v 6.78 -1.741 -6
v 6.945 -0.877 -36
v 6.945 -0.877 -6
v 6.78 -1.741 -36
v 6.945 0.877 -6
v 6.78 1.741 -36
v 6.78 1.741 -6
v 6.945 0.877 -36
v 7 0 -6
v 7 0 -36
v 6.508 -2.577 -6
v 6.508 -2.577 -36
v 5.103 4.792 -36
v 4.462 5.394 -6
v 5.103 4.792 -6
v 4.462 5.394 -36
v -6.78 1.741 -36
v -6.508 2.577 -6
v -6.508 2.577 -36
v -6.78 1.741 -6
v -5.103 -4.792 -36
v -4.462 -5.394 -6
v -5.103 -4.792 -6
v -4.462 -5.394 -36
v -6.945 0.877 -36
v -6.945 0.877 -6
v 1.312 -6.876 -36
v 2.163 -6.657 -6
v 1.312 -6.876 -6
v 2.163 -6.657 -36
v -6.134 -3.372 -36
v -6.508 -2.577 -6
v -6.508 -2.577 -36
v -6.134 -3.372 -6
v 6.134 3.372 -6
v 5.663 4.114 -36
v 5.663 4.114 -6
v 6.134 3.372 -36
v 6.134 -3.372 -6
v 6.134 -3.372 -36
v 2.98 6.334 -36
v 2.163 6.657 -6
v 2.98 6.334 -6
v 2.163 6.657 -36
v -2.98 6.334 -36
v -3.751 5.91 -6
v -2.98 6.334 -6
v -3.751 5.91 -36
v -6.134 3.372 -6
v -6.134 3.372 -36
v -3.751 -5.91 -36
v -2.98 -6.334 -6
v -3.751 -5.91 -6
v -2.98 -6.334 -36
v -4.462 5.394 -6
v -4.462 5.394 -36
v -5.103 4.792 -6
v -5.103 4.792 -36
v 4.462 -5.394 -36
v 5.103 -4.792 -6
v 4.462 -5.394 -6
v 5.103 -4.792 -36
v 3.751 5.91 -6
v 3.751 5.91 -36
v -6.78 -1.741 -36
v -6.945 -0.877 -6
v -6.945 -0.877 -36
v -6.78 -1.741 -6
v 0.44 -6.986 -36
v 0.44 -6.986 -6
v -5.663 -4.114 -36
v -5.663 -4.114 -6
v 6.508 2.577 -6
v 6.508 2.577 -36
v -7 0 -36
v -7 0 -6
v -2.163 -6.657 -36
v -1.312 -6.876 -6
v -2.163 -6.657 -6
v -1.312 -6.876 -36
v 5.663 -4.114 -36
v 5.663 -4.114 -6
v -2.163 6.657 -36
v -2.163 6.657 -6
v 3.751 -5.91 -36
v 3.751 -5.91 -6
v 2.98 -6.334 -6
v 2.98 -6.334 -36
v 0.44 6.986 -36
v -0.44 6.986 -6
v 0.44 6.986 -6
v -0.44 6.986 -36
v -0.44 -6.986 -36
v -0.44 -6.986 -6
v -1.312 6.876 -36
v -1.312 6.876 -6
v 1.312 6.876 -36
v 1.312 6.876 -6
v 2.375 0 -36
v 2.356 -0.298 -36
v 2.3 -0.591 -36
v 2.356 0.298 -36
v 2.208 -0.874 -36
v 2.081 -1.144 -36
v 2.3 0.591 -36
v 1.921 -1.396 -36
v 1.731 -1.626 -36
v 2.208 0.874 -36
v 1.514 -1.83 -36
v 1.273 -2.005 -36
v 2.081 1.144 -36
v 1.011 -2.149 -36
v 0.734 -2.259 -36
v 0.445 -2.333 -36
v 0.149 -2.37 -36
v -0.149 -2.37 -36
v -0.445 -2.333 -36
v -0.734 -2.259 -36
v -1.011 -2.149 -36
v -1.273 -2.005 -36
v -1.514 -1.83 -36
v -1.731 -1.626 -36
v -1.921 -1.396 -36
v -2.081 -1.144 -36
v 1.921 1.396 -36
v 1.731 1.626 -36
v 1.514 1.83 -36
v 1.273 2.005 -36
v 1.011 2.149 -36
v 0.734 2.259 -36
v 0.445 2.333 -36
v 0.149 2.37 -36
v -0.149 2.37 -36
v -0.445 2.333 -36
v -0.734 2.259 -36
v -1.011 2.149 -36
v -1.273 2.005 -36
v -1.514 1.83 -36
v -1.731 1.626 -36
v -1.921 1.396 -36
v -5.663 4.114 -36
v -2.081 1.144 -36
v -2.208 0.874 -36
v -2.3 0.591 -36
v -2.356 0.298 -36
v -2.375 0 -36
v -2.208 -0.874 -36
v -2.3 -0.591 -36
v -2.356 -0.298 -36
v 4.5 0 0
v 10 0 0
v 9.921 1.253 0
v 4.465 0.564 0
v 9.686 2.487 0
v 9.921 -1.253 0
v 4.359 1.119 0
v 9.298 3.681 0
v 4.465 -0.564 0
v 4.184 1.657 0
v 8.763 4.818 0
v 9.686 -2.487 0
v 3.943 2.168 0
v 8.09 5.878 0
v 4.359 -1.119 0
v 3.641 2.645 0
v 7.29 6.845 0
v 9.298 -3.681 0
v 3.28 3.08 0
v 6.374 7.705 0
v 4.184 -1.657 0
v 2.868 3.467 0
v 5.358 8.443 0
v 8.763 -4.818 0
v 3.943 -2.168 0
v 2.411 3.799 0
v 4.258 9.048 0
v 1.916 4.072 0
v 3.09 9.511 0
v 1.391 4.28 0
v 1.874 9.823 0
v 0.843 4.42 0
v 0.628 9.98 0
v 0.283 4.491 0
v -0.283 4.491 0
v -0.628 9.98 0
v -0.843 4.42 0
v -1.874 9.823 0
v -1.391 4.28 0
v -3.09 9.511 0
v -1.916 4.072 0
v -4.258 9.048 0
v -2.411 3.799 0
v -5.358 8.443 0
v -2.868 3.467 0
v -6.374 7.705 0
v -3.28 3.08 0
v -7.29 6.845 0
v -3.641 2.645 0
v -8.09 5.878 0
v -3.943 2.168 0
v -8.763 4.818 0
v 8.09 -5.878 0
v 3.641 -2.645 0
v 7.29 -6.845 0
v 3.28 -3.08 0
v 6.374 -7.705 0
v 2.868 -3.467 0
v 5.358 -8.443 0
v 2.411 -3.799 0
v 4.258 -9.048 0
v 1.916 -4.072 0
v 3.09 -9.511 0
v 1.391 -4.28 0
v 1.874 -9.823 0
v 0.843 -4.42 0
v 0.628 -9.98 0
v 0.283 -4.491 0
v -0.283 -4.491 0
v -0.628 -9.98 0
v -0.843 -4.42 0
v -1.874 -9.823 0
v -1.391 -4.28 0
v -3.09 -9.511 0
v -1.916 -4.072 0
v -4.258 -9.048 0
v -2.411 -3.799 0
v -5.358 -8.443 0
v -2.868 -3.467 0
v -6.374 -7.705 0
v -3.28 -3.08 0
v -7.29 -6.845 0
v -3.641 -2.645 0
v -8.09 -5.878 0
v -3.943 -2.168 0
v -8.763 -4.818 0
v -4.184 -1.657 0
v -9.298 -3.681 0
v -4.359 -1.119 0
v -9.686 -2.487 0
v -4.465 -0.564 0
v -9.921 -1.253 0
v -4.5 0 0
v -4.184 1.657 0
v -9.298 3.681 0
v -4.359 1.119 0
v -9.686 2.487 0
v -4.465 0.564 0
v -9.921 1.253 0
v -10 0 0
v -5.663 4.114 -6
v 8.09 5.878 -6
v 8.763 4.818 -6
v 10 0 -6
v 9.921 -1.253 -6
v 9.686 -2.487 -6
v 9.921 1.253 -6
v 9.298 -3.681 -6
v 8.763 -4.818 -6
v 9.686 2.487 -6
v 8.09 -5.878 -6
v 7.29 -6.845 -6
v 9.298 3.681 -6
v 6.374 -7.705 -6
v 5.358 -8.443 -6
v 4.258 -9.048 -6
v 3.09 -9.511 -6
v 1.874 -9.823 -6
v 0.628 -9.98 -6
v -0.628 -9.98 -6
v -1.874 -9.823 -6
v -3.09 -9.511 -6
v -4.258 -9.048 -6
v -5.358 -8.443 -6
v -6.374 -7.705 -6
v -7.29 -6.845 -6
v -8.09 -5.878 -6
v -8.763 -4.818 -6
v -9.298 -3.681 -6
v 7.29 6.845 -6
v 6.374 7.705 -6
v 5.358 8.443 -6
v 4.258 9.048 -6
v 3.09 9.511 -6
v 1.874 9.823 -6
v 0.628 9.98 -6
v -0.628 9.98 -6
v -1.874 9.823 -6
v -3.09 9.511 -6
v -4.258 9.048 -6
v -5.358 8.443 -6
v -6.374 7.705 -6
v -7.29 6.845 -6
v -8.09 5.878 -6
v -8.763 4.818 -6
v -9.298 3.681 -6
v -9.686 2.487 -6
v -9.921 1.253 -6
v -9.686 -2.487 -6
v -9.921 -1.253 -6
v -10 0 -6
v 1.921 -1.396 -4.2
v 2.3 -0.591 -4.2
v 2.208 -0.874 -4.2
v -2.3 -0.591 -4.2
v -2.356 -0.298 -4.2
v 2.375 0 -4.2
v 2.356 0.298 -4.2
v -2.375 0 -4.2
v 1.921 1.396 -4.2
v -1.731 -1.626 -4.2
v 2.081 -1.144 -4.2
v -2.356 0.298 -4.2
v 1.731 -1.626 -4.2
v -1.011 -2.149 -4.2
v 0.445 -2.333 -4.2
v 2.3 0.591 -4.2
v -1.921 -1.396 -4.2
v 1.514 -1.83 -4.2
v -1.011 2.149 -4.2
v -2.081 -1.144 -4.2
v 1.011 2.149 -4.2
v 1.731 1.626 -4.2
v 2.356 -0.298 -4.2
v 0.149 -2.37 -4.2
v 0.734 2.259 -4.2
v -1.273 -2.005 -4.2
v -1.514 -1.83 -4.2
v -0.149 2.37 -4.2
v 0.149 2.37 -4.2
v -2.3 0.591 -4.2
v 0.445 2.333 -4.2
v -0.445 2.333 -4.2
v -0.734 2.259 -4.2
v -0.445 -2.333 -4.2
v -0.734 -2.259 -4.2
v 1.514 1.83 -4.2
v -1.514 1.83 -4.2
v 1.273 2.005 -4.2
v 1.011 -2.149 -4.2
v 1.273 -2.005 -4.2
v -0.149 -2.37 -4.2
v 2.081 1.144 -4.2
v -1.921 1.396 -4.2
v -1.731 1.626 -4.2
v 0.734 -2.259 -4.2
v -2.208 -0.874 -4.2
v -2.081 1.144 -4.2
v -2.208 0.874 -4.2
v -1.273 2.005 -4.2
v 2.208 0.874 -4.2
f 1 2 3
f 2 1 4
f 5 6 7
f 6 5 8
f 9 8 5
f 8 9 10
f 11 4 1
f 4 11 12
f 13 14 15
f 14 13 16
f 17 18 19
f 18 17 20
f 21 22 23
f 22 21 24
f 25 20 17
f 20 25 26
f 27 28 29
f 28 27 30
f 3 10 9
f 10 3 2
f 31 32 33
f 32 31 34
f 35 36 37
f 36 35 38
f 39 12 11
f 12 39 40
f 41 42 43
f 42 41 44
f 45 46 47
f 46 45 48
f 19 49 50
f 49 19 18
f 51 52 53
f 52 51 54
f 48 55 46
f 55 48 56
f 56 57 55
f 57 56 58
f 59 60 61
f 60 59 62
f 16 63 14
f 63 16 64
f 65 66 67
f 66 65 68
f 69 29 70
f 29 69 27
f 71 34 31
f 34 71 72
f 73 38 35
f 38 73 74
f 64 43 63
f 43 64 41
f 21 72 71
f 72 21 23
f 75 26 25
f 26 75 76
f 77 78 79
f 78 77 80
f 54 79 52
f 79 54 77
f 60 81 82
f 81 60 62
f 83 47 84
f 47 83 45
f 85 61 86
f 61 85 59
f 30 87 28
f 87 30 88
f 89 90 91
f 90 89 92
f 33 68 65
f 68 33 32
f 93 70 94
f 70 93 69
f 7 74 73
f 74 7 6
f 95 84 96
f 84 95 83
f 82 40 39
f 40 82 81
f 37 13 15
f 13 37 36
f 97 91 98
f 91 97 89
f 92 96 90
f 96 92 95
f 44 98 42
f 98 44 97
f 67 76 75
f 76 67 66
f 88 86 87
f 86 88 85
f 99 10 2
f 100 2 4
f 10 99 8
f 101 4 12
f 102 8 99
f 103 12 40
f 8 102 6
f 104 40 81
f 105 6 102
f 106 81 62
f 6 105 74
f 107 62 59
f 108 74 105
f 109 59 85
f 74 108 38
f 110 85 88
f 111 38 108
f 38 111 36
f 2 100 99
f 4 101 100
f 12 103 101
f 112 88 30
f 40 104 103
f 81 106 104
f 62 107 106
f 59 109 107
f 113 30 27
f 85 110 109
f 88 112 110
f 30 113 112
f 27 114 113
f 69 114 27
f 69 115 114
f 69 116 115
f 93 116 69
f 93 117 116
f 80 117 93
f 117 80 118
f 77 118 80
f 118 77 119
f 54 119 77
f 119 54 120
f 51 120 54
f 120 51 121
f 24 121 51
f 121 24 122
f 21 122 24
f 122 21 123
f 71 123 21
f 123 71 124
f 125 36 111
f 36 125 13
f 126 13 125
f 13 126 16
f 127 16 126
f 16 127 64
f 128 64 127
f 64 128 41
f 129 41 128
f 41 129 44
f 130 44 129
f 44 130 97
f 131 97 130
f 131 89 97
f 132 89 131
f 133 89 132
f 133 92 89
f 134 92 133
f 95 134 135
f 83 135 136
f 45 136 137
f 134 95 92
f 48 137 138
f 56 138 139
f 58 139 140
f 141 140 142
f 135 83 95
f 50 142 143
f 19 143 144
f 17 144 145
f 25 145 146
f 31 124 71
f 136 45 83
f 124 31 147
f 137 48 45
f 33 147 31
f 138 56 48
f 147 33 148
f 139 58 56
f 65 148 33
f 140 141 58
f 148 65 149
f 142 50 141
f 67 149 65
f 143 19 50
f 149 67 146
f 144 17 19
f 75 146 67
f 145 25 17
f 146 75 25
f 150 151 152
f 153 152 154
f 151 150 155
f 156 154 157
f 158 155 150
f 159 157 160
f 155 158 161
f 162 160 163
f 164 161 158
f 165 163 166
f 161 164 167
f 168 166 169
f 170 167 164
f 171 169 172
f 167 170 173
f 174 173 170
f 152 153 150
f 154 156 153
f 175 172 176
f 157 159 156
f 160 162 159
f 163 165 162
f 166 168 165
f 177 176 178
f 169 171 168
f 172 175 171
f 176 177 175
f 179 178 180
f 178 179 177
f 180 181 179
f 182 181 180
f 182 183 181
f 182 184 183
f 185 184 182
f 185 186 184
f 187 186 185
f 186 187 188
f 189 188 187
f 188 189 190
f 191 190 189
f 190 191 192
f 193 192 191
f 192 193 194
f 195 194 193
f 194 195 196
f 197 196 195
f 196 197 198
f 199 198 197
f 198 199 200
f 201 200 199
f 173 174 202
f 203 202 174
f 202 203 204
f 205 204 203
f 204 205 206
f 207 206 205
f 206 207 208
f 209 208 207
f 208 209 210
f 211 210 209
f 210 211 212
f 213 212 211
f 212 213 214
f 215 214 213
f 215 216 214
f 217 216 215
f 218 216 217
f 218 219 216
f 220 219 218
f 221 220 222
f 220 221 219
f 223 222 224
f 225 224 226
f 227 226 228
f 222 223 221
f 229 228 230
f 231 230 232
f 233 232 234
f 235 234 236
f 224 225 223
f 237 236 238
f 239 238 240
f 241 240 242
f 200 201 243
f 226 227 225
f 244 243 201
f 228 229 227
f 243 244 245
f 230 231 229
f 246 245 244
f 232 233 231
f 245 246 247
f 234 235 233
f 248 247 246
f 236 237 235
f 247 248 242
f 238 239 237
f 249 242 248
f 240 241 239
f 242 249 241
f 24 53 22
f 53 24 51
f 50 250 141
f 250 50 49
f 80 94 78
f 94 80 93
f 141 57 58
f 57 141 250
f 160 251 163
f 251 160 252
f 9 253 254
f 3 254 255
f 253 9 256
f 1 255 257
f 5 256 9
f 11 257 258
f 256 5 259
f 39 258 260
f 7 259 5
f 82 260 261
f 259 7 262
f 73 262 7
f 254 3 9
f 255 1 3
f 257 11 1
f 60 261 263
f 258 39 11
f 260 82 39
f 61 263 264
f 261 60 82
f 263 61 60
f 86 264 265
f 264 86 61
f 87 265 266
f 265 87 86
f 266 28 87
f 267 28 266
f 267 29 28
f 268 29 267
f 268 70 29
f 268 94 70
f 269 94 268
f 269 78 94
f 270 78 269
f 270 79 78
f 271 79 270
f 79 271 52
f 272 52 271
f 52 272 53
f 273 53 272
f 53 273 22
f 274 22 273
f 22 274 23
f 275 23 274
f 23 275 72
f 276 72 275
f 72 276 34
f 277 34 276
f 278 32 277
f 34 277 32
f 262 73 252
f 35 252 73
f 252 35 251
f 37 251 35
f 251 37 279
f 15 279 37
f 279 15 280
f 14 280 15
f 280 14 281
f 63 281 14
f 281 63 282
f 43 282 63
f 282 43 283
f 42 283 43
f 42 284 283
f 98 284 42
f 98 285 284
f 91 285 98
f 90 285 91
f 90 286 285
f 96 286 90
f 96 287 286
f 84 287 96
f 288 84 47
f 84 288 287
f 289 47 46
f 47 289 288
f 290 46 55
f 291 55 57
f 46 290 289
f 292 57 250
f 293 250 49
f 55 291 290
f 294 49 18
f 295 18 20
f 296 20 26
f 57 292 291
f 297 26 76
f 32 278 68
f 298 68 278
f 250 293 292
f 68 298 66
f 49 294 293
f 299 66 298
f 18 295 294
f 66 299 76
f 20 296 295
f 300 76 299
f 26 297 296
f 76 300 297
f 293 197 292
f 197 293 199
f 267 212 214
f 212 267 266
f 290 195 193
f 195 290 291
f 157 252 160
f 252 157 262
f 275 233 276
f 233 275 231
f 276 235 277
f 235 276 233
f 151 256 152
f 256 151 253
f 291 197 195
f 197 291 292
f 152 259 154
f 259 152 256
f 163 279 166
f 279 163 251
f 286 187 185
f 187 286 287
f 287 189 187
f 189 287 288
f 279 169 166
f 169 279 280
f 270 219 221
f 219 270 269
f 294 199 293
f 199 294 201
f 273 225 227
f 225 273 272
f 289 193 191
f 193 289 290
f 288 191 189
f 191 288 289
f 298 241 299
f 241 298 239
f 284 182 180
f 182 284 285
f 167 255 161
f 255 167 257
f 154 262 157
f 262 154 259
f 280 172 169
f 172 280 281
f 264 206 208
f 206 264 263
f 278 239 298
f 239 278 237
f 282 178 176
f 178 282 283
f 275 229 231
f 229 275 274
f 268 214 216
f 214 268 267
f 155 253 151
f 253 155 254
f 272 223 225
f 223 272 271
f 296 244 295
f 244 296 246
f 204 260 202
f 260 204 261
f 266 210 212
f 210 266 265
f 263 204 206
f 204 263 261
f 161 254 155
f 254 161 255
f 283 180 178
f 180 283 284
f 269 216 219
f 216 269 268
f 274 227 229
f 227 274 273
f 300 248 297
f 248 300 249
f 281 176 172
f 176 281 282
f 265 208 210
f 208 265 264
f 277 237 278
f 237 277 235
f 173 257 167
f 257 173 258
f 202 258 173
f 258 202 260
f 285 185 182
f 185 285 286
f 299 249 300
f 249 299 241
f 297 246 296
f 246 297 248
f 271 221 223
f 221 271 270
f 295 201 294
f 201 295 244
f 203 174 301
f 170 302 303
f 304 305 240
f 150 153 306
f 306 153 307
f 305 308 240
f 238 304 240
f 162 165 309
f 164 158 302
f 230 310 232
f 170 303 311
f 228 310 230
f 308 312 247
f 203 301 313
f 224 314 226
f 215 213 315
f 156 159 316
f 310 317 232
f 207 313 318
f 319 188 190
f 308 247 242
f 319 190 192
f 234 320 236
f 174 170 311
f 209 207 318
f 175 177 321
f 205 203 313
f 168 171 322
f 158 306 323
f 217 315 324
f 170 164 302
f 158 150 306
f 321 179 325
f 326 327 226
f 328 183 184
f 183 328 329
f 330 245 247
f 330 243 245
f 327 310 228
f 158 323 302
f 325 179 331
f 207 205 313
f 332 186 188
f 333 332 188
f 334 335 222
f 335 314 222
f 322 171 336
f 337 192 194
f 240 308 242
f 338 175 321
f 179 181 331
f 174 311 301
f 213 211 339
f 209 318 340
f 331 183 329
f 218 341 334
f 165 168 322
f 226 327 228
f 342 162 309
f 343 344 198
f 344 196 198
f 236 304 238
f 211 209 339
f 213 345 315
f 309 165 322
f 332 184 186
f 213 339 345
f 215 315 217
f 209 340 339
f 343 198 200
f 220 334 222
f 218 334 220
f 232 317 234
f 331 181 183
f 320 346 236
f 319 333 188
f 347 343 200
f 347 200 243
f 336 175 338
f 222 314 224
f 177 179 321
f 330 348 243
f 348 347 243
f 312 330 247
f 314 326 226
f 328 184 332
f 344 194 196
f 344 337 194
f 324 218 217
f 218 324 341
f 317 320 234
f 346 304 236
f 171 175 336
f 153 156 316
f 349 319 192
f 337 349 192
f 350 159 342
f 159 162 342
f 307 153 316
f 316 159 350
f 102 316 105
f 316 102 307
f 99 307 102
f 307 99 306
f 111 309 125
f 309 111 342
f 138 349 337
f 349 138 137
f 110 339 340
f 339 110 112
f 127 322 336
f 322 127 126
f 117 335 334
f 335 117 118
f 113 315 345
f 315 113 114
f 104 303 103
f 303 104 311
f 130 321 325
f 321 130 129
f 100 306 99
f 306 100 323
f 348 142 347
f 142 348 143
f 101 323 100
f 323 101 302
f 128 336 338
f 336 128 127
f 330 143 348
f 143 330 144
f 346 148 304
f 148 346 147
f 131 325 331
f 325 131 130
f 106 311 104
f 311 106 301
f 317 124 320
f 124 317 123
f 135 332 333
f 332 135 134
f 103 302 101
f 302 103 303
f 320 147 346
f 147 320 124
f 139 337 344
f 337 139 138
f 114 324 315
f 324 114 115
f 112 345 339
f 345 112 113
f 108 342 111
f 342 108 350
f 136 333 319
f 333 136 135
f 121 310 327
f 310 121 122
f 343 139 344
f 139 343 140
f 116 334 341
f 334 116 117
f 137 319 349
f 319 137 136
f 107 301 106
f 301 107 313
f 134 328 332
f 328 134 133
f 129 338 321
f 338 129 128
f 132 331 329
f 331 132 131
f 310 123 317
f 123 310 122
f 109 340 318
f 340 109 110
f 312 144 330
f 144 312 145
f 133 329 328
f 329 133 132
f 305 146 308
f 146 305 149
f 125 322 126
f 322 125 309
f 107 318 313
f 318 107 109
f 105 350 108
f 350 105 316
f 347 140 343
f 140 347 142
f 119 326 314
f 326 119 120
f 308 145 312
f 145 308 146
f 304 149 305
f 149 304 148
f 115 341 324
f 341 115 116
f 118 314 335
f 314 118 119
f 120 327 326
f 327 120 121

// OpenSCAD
$fn = 50;


difference() {
	union() {
		translate(v = [0, 0, -36.0000000000]) {
			cylinder(h = 36, r = 7.0000000000);
		}
		translate(v = [0, 0, -6.0000000000]) {
			cylinder(h = 6, r = 10.0000000000);
		}
	}
	union() {
		translate(v = [0, 0, 0]) {
			rotate(a = [0, 0, 0]) {
				difference() {
					union() {
						#translate(v = [0, 0, -36.0000000000]) {
							cylinder(h = 36, r = 2.2500000000);
						}
						#translate(v = [0, 0, -4.2000000000]) {
							cylinder(h = 4.2000000000, r = 7.0000000000, r1 = 2.3750000000, r2 = 4.5000000000);
						}
						#translate(v = [0, 0, -36.0000000000]) {
							cylinder(h = 36, r = 2.3750000000);
						}
						#translate(v = [0, 0, -36.0000000000]) {
							cylinder(h = 36, r = 2.2500000000);
						}
					}
					union();
				}
			}
		}
	}
}
